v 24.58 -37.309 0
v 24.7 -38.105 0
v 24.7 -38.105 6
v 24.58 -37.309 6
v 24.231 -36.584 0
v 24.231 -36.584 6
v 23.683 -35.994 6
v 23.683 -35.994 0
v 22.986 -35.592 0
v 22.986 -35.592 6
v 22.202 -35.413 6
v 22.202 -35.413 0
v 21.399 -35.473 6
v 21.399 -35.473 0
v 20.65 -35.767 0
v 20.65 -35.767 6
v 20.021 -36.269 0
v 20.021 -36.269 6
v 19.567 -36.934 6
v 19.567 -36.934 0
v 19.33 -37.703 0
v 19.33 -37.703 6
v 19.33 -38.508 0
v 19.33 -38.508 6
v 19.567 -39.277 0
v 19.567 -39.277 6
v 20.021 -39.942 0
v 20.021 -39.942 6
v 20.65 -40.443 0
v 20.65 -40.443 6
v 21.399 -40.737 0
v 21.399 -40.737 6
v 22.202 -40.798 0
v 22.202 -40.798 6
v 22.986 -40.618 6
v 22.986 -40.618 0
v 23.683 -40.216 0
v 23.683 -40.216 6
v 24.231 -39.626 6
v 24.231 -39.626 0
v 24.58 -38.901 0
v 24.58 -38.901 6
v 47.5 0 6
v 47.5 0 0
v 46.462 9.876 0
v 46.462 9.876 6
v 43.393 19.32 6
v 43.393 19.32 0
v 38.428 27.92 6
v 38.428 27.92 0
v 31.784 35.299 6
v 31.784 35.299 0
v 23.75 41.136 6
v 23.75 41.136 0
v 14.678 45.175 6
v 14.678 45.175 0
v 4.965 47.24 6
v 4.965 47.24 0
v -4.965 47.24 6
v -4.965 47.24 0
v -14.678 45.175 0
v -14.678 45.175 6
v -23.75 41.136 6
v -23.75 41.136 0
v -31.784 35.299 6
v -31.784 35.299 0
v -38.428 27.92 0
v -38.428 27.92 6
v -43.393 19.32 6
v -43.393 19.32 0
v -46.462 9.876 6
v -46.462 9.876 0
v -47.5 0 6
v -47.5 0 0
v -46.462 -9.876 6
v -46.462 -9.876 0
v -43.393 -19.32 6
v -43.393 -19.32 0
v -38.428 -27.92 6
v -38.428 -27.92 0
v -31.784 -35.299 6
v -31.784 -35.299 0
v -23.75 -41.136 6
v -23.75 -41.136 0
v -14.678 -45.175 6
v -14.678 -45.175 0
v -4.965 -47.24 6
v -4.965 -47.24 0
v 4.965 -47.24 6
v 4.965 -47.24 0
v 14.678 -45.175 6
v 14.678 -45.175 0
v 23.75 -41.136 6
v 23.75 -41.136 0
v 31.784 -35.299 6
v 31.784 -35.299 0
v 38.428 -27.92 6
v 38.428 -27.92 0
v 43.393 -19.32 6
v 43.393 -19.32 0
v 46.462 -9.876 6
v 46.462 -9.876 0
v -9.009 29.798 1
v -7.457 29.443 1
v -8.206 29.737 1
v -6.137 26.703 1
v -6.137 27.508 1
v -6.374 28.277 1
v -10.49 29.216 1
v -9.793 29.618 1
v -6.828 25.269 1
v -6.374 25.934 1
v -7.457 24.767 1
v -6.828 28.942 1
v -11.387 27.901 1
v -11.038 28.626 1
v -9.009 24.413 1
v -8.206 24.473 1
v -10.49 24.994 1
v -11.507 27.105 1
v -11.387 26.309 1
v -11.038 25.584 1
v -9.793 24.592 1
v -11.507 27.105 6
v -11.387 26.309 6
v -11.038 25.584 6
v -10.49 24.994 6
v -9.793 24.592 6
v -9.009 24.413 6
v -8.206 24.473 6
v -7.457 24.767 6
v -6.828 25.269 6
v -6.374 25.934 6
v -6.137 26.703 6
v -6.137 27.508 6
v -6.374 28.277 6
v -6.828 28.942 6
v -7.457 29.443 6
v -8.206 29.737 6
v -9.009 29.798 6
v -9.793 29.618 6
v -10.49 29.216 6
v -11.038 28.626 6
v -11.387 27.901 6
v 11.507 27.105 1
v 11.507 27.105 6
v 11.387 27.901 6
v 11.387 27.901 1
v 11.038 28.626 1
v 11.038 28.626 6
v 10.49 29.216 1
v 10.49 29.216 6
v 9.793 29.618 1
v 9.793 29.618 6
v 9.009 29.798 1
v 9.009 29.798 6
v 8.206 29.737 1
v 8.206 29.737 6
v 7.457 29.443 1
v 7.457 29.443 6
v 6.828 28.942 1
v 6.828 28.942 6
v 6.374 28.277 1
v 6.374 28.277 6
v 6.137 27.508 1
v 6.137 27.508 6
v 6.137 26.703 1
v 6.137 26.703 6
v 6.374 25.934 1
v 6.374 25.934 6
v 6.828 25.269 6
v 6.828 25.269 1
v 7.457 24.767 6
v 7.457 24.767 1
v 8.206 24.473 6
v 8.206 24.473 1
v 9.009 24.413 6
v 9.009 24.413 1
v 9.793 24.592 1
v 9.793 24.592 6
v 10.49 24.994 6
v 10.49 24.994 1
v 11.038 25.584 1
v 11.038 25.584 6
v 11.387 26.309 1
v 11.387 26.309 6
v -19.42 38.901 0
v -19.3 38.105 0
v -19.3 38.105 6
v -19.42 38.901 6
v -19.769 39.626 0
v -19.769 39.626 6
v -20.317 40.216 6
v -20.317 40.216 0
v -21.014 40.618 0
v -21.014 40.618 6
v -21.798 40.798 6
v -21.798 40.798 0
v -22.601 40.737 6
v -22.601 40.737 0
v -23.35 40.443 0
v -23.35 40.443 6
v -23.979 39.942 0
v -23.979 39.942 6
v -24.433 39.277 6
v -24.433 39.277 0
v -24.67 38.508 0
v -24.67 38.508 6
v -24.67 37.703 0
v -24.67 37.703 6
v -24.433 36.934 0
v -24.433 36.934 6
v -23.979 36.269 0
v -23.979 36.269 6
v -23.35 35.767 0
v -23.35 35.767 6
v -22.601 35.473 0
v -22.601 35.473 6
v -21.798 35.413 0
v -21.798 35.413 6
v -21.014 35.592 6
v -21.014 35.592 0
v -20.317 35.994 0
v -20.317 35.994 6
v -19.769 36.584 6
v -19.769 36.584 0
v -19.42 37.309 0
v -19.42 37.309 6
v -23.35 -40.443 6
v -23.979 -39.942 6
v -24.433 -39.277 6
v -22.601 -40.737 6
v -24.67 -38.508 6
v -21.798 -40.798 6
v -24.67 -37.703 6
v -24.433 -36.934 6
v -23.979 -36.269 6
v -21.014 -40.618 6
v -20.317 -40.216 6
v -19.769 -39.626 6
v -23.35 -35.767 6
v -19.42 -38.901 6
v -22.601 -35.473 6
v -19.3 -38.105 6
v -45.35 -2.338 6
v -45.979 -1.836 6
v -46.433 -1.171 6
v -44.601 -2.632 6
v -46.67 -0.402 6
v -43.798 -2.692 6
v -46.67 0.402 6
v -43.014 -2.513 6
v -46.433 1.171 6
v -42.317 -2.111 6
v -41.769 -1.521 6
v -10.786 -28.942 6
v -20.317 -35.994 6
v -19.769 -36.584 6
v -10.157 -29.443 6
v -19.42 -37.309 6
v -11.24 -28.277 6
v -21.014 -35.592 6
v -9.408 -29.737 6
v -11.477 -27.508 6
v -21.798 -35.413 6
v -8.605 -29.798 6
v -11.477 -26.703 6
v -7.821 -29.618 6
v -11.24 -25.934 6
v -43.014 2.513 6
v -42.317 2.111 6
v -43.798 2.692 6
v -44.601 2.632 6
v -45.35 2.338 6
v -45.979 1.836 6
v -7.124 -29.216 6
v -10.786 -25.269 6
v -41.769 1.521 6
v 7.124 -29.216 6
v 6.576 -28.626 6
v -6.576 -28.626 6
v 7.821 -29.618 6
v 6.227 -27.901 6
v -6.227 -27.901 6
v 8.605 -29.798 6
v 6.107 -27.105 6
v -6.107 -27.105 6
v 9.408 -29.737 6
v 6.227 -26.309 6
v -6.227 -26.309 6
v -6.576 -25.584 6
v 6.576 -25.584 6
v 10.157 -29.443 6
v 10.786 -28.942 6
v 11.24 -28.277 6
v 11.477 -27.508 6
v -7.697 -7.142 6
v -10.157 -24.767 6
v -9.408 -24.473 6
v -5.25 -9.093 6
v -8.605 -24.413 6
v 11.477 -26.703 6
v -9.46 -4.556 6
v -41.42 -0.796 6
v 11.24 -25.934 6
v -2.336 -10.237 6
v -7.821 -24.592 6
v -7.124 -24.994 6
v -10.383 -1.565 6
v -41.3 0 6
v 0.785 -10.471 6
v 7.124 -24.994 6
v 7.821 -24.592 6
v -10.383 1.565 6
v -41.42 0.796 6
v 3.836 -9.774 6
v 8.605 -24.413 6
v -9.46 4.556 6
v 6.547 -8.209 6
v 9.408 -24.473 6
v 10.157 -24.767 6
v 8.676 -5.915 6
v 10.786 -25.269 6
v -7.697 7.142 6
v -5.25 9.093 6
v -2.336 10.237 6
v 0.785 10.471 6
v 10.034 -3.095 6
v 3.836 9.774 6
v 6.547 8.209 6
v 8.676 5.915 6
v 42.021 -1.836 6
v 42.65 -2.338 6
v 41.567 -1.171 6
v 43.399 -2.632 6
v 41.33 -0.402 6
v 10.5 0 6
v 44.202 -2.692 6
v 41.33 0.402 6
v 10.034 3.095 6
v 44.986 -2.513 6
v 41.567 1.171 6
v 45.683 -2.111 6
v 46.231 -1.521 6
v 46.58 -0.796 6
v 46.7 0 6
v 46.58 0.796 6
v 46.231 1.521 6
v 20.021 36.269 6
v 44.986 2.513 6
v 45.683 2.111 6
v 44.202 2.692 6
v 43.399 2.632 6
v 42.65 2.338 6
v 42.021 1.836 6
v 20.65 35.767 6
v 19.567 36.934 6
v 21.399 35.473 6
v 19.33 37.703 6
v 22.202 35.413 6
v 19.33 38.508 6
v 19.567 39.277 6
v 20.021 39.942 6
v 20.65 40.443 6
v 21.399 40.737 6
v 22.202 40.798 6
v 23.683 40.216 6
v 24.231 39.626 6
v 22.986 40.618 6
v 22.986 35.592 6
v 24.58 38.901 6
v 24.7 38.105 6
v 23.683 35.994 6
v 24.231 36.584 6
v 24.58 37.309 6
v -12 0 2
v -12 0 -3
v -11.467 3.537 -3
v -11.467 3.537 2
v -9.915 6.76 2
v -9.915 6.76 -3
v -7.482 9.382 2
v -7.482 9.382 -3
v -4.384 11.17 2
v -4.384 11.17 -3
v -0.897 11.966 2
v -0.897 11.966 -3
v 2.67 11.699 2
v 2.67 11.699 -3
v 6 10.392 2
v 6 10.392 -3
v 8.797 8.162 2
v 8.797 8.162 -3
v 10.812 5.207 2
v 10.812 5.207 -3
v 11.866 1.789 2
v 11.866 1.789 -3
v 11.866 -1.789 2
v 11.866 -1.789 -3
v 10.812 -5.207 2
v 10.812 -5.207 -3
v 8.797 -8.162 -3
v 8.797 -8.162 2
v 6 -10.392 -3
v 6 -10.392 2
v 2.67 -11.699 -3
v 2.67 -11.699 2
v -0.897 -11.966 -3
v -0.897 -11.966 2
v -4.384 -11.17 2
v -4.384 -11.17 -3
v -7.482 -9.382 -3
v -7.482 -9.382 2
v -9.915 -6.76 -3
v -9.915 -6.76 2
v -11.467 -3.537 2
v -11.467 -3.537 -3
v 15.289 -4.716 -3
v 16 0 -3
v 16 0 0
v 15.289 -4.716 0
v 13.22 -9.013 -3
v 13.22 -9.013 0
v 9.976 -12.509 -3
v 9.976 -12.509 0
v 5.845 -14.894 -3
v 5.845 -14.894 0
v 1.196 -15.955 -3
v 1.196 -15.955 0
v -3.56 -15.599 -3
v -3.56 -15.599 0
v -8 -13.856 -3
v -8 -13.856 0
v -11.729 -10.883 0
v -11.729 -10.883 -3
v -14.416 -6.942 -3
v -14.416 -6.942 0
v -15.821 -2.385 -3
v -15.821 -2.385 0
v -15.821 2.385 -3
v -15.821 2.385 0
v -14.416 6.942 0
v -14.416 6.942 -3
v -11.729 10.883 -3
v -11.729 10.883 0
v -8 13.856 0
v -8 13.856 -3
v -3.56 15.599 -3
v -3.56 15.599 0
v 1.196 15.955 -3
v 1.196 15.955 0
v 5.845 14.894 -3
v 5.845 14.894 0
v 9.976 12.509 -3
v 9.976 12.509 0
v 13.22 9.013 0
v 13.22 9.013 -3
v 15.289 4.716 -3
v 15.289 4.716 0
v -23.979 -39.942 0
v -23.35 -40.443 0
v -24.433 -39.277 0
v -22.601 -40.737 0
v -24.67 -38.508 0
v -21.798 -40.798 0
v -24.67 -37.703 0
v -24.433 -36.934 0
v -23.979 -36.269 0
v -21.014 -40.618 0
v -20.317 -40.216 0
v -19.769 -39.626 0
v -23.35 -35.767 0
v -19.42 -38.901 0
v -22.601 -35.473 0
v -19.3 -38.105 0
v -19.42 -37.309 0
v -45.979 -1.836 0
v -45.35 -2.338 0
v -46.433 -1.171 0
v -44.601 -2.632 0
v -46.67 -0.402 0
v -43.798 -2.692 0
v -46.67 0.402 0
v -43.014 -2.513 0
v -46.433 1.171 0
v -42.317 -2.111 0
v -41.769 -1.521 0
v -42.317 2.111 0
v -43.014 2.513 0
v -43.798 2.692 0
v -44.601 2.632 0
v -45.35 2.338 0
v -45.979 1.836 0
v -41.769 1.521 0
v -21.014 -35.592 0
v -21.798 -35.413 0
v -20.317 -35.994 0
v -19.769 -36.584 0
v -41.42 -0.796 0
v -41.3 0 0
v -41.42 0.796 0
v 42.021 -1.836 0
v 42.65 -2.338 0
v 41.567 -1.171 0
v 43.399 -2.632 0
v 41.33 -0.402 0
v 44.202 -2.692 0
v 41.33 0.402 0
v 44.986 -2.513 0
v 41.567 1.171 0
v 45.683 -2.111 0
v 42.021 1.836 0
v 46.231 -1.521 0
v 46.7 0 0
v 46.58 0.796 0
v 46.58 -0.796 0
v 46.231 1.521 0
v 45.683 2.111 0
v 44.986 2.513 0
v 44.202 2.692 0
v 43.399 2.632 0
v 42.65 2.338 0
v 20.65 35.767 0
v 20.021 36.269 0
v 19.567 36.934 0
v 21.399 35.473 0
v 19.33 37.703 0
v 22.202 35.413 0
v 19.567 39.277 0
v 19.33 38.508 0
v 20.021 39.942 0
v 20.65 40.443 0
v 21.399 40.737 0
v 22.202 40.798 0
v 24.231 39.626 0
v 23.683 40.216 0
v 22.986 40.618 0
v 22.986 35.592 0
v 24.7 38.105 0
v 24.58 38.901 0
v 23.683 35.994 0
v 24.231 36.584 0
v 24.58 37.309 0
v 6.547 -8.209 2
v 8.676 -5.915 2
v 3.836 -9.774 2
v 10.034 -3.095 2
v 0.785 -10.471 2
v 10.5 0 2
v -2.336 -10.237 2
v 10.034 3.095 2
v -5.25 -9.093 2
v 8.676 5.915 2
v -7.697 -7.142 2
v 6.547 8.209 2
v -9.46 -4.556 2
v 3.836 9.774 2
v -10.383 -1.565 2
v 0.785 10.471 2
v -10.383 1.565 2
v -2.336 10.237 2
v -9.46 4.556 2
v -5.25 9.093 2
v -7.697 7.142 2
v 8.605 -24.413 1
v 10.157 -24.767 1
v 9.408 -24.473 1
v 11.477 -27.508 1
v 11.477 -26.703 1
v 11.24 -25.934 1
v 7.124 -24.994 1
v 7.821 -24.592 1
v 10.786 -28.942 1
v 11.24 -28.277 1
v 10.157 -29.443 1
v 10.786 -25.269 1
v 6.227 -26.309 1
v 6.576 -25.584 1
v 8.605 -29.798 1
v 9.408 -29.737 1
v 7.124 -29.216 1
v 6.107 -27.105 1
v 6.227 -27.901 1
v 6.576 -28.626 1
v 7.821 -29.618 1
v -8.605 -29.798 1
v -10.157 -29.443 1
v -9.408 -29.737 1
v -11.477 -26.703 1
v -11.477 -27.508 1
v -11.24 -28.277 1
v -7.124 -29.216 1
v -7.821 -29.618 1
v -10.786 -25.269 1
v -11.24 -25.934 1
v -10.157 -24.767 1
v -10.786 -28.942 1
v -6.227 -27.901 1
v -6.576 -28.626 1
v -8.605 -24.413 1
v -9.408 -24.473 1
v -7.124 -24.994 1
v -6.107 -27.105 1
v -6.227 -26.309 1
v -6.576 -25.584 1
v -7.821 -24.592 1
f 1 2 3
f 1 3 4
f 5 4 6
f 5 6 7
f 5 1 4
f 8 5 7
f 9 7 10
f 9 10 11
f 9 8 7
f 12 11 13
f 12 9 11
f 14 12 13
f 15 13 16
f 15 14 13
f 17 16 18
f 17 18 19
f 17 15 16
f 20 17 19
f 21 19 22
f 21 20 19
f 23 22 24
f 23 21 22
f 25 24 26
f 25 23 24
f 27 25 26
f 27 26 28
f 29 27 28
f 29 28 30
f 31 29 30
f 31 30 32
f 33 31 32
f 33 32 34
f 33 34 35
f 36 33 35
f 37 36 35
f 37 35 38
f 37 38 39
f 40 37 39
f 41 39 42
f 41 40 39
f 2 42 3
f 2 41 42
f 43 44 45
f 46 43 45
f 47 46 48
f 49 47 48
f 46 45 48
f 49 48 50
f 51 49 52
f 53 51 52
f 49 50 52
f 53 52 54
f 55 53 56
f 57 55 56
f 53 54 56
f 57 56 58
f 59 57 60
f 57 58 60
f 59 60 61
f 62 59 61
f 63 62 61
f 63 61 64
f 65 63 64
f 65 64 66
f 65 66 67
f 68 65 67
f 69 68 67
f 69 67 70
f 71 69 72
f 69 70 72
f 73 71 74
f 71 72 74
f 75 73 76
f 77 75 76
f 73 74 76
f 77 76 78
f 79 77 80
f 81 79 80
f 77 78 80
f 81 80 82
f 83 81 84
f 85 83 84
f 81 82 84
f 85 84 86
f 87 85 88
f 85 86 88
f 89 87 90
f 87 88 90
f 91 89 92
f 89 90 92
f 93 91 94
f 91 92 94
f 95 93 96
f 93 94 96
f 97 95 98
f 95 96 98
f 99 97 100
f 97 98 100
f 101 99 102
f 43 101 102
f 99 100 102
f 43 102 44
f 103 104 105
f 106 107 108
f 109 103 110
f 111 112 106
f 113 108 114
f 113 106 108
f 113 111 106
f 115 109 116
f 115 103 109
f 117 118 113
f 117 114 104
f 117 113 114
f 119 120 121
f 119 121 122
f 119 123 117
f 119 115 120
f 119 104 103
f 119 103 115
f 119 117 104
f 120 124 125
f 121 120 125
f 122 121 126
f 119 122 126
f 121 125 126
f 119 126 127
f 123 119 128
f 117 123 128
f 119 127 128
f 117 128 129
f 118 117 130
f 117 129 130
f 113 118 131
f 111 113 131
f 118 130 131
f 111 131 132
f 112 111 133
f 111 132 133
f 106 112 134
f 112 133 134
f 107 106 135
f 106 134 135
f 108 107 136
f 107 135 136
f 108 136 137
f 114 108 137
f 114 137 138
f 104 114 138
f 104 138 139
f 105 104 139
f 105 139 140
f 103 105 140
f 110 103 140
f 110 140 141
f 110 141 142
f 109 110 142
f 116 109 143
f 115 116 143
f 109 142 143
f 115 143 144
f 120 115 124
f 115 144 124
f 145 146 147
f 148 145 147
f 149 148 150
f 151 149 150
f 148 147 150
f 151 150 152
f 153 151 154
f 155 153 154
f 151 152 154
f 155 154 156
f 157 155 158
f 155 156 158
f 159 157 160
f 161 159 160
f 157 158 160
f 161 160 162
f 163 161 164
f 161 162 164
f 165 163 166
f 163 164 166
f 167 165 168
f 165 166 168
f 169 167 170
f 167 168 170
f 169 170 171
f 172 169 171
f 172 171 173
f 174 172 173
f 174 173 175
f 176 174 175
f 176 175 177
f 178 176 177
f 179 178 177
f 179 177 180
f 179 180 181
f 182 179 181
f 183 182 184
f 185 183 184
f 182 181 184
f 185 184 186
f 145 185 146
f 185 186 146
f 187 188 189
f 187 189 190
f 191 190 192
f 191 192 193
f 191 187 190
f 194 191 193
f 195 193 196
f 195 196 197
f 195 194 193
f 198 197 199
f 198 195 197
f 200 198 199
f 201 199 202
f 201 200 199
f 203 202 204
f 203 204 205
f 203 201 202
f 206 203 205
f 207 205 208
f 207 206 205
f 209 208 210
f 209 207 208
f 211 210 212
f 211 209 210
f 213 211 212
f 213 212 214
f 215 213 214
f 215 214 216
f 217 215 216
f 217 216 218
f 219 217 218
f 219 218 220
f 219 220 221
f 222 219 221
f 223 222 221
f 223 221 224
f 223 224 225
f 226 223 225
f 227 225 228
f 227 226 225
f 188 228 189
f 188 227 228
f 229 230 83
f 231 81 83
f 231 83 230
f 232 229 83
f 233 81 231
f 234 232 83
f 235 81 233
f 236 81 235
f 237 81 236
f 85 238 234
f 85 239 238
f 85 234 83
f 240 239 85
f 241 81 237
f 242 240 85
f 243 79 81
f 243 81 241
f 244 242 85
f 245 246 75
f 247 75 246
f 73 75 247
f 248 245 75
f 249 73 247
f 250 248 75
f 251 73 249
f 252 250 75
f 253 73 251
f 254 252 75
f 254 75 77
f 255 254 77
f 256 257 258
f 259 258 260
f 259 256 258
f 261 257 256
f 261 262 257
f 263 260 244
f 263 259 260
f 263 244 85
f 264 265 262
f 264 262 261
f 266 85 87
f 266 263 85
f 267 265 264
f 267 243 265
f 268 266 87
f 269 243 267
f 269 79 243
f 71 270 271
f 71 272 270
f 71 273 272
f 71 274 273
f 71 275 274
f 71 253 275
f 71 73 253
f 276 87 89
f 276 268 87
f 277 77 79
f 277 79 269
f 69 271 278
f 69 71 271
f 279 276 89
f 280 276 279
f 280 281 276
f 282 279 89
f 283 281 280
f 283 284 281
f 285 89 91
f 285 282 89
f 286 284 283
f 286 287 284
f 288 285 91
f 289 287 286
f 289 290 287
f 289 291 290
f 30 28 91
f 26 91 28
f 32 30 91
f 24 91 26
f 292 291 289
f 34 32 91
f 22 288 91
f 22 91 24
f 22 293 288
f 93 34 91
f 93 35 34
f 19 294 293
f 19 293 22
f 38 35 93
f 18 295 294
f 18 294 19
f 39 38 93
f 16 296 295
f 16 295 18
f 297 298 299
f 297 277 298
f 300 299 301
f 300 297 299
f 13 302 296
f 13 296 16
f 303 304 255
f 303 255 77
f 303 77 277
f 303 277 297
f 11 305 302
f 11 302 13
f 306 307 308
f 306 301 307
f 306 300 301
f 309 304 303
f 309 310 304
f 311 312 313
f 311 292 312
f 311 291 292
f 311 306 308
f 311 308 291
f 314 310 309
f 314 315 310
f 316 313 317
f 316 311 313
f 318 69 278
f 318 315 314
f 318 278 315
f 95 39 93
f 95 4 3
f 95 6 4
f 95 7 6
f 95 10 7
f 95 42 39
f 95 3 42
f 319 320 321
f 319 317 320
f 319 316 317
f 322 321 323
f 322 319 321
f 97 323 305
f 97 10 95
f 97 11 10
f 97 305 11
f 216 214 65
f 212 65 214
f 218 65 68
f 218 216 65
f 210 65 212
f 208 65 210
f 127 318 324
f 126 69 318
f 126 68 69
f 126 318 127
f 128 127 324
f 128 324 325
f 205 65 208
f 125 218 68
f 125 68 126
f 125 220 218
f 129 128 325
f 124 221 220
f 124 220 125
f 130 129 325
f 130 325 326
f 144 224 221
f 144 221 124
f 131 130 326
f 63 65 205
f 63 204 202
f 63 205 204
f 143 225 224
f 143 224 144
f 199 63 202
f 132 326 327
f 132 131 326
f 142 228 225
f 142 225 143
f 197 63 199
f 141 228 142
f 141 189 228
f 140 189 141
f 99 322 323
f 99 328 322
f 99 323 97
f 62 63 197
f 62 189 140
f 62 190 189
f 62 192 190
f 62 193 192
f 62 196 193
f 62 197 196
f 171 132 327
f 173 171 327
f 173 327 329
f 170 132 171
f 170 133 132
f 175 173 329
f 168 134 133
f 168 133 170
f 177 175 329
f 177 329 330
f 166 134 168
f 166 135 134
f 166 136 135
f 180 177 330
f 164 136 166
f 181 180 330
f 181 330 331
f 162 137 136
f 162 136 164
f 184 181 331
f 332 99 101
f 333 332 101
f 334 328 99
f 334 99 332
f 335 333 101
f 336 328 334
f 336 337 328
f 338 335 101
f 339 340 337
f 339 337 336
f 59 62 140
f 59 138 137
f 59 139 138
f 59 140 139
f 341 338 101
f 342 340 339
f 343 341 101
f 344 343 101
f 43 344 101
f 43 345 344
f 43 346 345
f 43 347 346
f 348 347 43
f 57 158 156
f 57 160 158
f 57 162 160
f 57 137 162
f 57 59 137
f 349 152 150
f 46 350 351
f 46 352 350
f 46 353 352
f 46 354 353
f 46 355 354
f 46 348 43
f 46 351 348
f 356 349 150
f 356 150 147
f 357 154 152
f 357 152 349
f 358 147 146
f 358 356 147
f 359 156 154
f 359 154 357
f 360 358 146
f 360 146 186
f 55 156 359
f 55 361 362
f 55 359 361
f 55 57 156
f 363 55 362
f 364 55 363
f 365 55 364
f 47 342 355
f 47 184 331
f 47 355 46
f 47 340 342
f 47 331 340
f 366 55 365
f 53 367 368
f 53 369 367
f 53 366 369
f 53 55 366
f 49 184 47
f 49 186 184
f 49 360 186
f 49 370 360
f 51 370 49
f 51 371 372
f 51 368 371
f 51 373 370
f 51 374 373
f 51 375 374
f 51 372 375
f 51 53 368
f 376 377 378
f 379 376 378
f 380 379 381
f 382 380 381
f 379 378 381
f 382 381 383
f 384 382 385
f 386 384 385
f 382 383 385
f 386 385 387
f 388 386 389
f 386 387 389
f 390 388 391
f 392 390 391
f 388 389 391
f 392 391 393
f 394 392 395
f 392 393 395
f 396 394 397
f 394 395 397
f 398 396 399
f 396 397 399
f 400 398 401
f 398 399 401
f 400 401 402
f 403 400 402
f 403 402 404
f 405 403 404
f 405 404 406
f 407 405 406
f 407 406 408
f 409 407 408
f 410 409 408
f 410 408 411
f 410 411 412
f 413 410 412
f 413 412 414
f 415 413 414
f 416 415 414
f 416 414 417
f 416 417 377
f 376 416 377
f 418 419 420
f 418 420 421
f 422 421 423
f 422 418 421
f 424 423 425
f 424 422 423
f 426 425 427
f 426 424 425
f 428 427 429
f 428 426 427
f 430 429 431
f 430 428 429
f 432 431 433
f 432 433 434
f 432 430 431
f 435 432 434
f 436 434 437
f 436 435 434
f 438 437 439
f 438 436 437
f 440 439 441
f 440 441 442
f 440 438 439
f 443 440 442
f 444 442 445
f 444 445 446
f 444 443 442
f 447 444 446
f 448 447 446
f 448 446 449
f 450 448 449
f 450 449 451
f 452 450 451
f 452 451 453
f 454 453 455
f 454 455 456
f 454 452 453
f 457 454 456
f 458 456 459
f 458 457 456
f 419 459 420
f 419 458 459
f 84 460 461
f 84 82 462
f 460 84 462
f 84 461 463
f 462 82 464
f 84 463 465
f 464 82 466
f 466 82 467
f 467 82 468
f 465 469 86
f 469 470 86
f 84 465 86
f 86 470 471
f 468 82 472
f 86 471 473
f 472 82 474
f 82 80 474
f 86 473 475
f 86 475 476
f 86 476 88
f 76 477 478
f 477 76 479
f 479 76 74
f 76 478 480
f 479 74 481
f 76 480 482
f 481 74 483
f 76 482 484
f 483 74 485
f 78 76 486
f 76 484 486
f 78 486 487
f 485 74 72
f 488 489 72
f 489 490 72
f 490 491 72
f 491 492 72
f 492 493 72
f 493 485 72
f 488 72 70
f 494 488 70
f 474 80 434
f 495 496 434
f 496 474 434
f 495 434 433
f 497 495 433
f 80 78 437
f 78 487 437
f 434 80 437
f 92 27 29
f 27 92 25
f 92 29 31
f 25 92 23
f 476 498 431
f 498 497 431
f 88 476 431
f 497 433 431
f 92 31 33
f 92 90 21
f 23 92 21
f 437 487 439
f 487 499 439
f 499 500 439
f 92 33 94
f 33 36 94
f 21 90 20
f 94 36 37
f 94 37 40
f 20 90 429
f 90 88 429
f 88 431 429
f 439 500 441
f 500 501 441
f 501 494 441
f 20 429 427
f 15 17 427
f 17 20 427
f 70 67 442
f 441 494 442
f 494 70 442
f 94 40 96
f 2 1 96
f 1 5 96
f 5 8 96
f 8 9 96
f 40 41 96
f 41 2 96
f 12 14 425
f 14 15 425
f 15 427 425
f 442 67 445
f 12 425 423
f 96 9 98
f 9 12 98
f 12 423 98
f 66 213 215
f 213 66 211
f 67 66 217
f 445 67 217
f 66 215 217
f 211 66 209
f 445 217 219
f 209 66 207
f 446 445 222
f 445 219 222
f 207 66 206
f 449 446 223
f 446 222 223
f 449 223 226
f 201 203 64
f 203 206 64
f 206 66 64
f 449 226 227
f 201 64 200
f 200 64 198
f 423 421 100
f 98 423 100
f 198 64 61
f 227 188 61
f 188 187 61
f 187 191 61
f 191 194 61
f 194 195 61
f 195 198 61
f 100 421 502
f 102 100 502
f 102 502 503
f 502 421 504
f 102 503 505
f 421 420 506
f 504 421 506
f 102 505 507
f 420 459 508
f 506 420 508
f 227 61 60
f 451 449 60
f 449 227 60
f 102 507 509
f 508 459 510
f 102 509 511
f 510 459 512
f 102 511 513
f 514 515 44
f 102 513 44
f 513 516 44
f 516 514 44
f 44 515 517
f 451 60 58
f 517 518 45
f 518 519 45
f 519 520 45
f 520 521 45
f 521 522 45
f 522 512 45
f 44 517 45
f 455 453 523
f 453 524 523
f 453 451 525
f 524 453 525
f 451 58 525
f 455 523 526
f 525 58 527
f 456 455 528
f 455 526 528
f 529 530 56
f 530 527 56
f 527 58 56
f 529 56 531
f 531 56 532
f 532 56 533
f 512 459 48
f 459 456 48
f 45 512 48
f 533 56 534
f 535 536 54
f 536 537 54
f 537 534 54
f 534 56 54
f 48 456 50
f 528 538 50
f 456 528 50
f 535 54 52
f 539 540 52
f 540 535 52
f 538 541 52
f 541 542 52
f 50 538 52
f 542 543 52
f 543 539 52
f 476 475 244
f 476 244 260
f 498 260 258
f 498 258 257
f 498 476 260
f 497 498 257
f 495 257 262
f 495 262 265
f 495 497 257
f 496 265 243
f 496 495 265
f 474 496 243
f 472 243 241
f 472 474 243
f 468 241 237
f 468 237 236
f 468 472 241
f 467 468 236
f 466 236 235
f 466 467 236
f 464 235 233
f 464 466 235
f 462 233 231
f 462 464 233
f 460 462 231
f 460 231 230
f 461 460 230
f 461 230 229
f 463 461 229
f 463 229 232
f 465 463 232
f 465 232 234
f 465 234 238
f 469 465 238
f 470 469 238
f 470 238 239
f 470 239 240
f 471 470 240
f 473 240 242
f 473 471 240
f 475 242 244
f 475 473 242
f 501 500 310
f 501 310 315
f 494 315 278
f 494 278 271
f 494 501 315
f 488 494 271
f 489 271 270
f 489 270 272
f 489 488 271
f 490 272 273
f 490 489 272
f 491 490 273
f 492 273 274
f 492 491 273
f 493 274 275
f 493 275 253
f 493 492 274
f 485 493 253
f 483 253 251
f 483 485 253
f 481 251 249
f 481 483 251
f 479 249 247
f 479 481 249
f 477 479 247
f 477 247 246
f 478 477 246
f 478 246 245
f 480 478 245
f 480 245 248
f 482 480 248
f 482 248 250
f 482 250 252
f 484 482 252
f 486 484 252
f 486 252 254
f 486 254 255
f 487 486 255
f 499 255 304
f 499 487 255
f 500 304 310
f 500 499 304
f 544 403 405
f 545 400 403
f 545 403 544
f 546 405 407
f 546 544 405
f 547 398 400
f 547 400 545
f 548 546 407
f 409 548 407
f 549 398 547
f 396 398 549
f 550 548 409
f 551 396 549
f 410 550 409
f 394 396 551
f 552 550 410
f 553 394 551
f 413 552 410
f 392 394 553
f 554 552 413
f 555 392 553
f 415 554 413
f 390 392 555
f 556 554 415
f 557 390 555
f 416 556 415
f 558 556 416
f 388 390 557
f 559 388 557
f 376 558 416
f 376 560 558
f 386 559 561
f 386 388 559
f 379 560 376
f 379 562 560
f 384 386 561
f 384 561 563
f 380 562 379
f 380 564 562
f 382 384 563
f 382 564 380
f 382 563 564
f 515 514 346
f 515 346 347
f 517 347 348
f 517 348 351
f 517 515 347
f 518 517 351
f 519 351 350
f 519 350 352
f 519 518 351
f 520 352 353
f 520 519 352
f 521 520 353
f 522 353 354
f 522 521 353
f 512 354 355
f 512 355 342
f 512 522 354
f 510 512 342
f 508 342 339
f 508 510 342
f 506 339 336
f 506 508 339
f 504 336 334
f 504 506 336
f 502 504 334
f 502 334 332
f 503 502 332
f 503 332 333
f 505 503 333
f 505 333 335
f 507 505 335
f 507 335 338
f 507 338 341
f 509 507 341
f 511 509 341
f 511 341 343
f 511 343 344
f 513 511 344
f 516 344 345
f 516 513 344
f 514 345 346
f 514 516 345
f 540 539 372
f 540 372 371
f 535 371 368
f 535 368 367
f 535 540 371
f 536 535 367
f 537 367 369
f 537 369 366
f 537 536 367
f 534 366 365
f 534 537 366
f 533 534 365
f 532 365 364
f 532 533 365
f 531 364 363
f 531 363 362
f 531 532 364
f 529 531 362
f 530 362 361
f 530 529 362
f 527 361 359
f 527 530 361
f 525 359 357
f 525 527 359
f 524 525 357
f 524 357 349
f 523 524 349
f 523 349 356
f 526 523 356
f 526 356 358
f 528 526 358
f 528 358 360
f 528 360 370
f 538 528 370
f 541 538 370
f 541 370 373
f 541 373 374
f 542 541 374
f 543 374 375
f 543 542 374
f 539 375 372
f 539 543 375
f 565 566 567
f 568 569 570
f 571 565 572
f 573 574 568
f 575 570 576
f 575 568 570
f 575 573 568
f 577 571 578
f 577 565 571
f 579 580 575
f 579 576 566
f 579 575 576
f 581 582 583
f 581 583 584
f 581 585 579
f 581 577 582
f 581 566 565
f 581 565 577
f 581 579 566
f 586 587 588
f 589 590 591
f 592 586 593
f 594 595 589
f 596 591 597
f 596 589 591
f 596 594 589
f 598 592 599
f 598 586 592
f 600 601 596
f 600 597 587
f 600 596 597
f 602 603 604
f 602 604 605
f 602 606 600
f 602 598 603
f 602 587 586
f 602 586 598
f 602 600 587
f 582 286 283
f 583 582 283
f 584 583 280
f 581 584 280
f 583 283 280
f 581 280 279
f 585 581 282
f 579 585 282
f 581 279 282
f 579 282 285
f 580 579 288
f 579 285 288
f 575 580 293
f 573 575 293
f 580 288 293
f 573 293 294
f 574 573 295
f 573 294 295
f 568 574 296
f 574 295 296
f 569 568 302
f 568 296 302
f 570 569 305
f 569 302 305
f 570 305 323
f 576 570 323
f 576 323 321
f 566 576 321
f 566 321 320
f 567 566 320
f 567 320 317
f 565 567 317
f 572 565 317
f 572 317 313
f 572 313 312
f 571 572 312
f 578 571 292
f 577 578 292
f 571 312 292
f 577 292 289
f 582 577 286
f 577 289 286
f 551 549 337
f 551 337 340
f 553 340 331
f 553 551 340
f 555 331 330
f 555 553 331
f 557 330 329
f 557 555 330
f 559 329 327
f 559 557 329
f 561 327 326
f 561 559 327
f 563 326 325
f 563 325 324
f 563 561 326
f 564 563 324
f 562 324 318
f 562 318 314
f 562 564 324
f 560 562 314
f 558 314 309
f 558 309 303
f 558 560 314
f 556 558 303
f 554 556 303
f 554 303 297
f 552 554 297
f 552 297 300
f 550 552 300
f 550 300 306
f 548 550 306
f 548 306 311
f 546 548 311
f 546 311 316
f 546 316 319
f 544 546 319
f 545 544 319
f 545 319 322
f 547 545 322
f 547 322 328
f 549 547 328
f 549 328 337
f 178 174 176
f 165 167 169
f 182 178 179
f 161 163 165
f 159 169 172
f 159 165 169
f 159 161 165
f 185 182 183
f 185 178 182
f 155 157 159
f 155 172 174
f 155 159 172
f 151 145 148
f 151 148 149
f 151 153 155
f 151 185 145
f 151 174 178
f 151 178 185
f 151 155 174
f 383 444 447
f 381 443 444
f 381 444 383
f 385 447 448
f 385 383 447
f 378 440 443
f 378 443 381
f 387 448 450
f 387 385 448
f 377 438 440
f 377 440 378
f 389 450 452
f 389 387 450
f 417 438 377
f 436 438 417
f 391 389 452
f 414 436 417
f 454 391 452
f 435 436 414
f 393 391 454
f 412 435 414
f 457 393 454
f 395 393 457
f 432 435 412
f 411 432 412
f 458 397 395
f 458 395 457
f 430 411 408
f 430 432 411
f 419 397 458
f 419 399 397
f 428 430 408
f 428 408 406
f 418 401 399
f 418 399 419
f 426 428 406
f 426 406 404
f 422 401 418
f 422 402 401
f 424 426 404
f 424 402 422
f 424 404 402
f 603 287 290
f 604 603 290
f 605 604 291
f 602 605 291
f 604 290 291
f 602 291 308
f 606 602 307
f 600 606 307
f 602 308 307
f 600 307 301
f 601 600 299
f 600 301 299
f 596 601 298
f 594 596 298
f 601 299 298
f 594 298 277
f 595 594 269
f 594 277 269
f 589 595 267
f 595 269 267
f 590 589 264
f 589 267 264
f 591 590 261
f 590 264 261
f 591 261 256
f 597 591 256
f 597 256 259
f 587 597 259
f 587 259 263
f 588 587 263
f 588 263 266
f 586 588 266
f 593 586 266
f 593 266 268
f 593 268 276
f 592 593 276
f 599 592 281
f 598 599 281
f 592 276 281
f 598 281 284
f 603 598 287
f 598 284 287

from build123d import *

# Parameters (mm, degrees)
SKETCH1_R           = 47.5
SKETCH1_R_2         = 10.5
SKETCH1_R_3         = 2.7
BOSS_EXTRUDE1_DEPTH = 6
SKETCH2_R           = 12
CUT_EXTRUDE1_DEPTH  = 2
BOSS_EXTRUDE2_START = 3
SKETCH3_R           = 16
SKETCH3_R_2         = 12
BOSS_EXTRUDE2_DEPTH = 3
SKETCH4_R           = 2.7
CUT_EXTRUDE2_DEPTH  = 5


with BuildPart() as part:
    # Sketch1 → Boss-Extrude1 (new body)
    with BuildSketch(Plane.XY):
        Circle(SKETCH1_R)
        Circle(SKETCH1_R_2, mode=Mode.SUBTRACT)
        with Locations((44, 0)):
            Circle(SKETCH1_R_3, mode=Mode.SUBTRACT)
        with Locations((22, -38.105117767)):
            Circle(SKETCH1_R_3, mode=Mode.SUBTRACT)
        with Locations((-22, -38.105117767)):
            Circle(SKETCH1_R_3, mode=Mode.SUBTRACT)
        with Locations((-44, 0)):
            Circle(SKETCH1_R_3, mode=Mode.SUBTRACT)
        with Locations((-22, 38.105117767)):
            Circle(SKETCH1_R_3, mode=Mode.SUBTRACT)
        with Locations((22, 38.105117767)):
            Circle(SKETCH1_R_3, mode=Mode.SUBTRACT)
    extrude(amount=BOSS_EXTRUDE1_DEPTH)

    # Sketch2 → Cut-Extrude1 (cut)
    with BuildSketch(Plane(origin=(0, 0, 0), x_dir=(-1, 0, 0), z_dir=(0, 0, -1))):
        Circle(SKETCH2_R)
    extrude(amount=-CUT_EXTRUDE1_DEPTH, mode=Mode.SUBTRACT)

    # Sketch3 → Boss-Extrude2 (add)
    with BuildSketch(Plane(origin=(0, 0, 0), x_dir=(-1, 0, 0), z_dir=(0, 0, -1)).offset(BOSS_EXTRUDE2_START)):
        with Locations(Location((0, 0, 0), (0, 0, 180))):
            Circle(SKETCH3_R)
        Circle(SKETCH3_R_2, mode=Mode.SUBTRACT)
    extrude(amount=-BOSS_EXTRUDE2_DEPTH)

    # Sketch4 → Cut-Extrude2 (cut)
    with BuildSketch(Plane.XY.offset(6)):
        with Locations((8.80698434, 27.105110714)):
            Circle(SKETCH4_R)
        with Locations(Location((-8.80698434, 27.105110714, 0), (0, 0, 180))):
            Circle(SKETCH4_R)
        with Locations(Location((8.80698434, -27.105110714, 0), (0, 0, 180))):
            Circle(SKETCH4_R)
        with Locations((-8.80698434, -27.105110714)):
            Circle(SKETCH4_R)
    extrude(amount=-CUT_EXTRUDE2_DEPTH, mode=Mode.SUBTRACT)


solid = part.part
